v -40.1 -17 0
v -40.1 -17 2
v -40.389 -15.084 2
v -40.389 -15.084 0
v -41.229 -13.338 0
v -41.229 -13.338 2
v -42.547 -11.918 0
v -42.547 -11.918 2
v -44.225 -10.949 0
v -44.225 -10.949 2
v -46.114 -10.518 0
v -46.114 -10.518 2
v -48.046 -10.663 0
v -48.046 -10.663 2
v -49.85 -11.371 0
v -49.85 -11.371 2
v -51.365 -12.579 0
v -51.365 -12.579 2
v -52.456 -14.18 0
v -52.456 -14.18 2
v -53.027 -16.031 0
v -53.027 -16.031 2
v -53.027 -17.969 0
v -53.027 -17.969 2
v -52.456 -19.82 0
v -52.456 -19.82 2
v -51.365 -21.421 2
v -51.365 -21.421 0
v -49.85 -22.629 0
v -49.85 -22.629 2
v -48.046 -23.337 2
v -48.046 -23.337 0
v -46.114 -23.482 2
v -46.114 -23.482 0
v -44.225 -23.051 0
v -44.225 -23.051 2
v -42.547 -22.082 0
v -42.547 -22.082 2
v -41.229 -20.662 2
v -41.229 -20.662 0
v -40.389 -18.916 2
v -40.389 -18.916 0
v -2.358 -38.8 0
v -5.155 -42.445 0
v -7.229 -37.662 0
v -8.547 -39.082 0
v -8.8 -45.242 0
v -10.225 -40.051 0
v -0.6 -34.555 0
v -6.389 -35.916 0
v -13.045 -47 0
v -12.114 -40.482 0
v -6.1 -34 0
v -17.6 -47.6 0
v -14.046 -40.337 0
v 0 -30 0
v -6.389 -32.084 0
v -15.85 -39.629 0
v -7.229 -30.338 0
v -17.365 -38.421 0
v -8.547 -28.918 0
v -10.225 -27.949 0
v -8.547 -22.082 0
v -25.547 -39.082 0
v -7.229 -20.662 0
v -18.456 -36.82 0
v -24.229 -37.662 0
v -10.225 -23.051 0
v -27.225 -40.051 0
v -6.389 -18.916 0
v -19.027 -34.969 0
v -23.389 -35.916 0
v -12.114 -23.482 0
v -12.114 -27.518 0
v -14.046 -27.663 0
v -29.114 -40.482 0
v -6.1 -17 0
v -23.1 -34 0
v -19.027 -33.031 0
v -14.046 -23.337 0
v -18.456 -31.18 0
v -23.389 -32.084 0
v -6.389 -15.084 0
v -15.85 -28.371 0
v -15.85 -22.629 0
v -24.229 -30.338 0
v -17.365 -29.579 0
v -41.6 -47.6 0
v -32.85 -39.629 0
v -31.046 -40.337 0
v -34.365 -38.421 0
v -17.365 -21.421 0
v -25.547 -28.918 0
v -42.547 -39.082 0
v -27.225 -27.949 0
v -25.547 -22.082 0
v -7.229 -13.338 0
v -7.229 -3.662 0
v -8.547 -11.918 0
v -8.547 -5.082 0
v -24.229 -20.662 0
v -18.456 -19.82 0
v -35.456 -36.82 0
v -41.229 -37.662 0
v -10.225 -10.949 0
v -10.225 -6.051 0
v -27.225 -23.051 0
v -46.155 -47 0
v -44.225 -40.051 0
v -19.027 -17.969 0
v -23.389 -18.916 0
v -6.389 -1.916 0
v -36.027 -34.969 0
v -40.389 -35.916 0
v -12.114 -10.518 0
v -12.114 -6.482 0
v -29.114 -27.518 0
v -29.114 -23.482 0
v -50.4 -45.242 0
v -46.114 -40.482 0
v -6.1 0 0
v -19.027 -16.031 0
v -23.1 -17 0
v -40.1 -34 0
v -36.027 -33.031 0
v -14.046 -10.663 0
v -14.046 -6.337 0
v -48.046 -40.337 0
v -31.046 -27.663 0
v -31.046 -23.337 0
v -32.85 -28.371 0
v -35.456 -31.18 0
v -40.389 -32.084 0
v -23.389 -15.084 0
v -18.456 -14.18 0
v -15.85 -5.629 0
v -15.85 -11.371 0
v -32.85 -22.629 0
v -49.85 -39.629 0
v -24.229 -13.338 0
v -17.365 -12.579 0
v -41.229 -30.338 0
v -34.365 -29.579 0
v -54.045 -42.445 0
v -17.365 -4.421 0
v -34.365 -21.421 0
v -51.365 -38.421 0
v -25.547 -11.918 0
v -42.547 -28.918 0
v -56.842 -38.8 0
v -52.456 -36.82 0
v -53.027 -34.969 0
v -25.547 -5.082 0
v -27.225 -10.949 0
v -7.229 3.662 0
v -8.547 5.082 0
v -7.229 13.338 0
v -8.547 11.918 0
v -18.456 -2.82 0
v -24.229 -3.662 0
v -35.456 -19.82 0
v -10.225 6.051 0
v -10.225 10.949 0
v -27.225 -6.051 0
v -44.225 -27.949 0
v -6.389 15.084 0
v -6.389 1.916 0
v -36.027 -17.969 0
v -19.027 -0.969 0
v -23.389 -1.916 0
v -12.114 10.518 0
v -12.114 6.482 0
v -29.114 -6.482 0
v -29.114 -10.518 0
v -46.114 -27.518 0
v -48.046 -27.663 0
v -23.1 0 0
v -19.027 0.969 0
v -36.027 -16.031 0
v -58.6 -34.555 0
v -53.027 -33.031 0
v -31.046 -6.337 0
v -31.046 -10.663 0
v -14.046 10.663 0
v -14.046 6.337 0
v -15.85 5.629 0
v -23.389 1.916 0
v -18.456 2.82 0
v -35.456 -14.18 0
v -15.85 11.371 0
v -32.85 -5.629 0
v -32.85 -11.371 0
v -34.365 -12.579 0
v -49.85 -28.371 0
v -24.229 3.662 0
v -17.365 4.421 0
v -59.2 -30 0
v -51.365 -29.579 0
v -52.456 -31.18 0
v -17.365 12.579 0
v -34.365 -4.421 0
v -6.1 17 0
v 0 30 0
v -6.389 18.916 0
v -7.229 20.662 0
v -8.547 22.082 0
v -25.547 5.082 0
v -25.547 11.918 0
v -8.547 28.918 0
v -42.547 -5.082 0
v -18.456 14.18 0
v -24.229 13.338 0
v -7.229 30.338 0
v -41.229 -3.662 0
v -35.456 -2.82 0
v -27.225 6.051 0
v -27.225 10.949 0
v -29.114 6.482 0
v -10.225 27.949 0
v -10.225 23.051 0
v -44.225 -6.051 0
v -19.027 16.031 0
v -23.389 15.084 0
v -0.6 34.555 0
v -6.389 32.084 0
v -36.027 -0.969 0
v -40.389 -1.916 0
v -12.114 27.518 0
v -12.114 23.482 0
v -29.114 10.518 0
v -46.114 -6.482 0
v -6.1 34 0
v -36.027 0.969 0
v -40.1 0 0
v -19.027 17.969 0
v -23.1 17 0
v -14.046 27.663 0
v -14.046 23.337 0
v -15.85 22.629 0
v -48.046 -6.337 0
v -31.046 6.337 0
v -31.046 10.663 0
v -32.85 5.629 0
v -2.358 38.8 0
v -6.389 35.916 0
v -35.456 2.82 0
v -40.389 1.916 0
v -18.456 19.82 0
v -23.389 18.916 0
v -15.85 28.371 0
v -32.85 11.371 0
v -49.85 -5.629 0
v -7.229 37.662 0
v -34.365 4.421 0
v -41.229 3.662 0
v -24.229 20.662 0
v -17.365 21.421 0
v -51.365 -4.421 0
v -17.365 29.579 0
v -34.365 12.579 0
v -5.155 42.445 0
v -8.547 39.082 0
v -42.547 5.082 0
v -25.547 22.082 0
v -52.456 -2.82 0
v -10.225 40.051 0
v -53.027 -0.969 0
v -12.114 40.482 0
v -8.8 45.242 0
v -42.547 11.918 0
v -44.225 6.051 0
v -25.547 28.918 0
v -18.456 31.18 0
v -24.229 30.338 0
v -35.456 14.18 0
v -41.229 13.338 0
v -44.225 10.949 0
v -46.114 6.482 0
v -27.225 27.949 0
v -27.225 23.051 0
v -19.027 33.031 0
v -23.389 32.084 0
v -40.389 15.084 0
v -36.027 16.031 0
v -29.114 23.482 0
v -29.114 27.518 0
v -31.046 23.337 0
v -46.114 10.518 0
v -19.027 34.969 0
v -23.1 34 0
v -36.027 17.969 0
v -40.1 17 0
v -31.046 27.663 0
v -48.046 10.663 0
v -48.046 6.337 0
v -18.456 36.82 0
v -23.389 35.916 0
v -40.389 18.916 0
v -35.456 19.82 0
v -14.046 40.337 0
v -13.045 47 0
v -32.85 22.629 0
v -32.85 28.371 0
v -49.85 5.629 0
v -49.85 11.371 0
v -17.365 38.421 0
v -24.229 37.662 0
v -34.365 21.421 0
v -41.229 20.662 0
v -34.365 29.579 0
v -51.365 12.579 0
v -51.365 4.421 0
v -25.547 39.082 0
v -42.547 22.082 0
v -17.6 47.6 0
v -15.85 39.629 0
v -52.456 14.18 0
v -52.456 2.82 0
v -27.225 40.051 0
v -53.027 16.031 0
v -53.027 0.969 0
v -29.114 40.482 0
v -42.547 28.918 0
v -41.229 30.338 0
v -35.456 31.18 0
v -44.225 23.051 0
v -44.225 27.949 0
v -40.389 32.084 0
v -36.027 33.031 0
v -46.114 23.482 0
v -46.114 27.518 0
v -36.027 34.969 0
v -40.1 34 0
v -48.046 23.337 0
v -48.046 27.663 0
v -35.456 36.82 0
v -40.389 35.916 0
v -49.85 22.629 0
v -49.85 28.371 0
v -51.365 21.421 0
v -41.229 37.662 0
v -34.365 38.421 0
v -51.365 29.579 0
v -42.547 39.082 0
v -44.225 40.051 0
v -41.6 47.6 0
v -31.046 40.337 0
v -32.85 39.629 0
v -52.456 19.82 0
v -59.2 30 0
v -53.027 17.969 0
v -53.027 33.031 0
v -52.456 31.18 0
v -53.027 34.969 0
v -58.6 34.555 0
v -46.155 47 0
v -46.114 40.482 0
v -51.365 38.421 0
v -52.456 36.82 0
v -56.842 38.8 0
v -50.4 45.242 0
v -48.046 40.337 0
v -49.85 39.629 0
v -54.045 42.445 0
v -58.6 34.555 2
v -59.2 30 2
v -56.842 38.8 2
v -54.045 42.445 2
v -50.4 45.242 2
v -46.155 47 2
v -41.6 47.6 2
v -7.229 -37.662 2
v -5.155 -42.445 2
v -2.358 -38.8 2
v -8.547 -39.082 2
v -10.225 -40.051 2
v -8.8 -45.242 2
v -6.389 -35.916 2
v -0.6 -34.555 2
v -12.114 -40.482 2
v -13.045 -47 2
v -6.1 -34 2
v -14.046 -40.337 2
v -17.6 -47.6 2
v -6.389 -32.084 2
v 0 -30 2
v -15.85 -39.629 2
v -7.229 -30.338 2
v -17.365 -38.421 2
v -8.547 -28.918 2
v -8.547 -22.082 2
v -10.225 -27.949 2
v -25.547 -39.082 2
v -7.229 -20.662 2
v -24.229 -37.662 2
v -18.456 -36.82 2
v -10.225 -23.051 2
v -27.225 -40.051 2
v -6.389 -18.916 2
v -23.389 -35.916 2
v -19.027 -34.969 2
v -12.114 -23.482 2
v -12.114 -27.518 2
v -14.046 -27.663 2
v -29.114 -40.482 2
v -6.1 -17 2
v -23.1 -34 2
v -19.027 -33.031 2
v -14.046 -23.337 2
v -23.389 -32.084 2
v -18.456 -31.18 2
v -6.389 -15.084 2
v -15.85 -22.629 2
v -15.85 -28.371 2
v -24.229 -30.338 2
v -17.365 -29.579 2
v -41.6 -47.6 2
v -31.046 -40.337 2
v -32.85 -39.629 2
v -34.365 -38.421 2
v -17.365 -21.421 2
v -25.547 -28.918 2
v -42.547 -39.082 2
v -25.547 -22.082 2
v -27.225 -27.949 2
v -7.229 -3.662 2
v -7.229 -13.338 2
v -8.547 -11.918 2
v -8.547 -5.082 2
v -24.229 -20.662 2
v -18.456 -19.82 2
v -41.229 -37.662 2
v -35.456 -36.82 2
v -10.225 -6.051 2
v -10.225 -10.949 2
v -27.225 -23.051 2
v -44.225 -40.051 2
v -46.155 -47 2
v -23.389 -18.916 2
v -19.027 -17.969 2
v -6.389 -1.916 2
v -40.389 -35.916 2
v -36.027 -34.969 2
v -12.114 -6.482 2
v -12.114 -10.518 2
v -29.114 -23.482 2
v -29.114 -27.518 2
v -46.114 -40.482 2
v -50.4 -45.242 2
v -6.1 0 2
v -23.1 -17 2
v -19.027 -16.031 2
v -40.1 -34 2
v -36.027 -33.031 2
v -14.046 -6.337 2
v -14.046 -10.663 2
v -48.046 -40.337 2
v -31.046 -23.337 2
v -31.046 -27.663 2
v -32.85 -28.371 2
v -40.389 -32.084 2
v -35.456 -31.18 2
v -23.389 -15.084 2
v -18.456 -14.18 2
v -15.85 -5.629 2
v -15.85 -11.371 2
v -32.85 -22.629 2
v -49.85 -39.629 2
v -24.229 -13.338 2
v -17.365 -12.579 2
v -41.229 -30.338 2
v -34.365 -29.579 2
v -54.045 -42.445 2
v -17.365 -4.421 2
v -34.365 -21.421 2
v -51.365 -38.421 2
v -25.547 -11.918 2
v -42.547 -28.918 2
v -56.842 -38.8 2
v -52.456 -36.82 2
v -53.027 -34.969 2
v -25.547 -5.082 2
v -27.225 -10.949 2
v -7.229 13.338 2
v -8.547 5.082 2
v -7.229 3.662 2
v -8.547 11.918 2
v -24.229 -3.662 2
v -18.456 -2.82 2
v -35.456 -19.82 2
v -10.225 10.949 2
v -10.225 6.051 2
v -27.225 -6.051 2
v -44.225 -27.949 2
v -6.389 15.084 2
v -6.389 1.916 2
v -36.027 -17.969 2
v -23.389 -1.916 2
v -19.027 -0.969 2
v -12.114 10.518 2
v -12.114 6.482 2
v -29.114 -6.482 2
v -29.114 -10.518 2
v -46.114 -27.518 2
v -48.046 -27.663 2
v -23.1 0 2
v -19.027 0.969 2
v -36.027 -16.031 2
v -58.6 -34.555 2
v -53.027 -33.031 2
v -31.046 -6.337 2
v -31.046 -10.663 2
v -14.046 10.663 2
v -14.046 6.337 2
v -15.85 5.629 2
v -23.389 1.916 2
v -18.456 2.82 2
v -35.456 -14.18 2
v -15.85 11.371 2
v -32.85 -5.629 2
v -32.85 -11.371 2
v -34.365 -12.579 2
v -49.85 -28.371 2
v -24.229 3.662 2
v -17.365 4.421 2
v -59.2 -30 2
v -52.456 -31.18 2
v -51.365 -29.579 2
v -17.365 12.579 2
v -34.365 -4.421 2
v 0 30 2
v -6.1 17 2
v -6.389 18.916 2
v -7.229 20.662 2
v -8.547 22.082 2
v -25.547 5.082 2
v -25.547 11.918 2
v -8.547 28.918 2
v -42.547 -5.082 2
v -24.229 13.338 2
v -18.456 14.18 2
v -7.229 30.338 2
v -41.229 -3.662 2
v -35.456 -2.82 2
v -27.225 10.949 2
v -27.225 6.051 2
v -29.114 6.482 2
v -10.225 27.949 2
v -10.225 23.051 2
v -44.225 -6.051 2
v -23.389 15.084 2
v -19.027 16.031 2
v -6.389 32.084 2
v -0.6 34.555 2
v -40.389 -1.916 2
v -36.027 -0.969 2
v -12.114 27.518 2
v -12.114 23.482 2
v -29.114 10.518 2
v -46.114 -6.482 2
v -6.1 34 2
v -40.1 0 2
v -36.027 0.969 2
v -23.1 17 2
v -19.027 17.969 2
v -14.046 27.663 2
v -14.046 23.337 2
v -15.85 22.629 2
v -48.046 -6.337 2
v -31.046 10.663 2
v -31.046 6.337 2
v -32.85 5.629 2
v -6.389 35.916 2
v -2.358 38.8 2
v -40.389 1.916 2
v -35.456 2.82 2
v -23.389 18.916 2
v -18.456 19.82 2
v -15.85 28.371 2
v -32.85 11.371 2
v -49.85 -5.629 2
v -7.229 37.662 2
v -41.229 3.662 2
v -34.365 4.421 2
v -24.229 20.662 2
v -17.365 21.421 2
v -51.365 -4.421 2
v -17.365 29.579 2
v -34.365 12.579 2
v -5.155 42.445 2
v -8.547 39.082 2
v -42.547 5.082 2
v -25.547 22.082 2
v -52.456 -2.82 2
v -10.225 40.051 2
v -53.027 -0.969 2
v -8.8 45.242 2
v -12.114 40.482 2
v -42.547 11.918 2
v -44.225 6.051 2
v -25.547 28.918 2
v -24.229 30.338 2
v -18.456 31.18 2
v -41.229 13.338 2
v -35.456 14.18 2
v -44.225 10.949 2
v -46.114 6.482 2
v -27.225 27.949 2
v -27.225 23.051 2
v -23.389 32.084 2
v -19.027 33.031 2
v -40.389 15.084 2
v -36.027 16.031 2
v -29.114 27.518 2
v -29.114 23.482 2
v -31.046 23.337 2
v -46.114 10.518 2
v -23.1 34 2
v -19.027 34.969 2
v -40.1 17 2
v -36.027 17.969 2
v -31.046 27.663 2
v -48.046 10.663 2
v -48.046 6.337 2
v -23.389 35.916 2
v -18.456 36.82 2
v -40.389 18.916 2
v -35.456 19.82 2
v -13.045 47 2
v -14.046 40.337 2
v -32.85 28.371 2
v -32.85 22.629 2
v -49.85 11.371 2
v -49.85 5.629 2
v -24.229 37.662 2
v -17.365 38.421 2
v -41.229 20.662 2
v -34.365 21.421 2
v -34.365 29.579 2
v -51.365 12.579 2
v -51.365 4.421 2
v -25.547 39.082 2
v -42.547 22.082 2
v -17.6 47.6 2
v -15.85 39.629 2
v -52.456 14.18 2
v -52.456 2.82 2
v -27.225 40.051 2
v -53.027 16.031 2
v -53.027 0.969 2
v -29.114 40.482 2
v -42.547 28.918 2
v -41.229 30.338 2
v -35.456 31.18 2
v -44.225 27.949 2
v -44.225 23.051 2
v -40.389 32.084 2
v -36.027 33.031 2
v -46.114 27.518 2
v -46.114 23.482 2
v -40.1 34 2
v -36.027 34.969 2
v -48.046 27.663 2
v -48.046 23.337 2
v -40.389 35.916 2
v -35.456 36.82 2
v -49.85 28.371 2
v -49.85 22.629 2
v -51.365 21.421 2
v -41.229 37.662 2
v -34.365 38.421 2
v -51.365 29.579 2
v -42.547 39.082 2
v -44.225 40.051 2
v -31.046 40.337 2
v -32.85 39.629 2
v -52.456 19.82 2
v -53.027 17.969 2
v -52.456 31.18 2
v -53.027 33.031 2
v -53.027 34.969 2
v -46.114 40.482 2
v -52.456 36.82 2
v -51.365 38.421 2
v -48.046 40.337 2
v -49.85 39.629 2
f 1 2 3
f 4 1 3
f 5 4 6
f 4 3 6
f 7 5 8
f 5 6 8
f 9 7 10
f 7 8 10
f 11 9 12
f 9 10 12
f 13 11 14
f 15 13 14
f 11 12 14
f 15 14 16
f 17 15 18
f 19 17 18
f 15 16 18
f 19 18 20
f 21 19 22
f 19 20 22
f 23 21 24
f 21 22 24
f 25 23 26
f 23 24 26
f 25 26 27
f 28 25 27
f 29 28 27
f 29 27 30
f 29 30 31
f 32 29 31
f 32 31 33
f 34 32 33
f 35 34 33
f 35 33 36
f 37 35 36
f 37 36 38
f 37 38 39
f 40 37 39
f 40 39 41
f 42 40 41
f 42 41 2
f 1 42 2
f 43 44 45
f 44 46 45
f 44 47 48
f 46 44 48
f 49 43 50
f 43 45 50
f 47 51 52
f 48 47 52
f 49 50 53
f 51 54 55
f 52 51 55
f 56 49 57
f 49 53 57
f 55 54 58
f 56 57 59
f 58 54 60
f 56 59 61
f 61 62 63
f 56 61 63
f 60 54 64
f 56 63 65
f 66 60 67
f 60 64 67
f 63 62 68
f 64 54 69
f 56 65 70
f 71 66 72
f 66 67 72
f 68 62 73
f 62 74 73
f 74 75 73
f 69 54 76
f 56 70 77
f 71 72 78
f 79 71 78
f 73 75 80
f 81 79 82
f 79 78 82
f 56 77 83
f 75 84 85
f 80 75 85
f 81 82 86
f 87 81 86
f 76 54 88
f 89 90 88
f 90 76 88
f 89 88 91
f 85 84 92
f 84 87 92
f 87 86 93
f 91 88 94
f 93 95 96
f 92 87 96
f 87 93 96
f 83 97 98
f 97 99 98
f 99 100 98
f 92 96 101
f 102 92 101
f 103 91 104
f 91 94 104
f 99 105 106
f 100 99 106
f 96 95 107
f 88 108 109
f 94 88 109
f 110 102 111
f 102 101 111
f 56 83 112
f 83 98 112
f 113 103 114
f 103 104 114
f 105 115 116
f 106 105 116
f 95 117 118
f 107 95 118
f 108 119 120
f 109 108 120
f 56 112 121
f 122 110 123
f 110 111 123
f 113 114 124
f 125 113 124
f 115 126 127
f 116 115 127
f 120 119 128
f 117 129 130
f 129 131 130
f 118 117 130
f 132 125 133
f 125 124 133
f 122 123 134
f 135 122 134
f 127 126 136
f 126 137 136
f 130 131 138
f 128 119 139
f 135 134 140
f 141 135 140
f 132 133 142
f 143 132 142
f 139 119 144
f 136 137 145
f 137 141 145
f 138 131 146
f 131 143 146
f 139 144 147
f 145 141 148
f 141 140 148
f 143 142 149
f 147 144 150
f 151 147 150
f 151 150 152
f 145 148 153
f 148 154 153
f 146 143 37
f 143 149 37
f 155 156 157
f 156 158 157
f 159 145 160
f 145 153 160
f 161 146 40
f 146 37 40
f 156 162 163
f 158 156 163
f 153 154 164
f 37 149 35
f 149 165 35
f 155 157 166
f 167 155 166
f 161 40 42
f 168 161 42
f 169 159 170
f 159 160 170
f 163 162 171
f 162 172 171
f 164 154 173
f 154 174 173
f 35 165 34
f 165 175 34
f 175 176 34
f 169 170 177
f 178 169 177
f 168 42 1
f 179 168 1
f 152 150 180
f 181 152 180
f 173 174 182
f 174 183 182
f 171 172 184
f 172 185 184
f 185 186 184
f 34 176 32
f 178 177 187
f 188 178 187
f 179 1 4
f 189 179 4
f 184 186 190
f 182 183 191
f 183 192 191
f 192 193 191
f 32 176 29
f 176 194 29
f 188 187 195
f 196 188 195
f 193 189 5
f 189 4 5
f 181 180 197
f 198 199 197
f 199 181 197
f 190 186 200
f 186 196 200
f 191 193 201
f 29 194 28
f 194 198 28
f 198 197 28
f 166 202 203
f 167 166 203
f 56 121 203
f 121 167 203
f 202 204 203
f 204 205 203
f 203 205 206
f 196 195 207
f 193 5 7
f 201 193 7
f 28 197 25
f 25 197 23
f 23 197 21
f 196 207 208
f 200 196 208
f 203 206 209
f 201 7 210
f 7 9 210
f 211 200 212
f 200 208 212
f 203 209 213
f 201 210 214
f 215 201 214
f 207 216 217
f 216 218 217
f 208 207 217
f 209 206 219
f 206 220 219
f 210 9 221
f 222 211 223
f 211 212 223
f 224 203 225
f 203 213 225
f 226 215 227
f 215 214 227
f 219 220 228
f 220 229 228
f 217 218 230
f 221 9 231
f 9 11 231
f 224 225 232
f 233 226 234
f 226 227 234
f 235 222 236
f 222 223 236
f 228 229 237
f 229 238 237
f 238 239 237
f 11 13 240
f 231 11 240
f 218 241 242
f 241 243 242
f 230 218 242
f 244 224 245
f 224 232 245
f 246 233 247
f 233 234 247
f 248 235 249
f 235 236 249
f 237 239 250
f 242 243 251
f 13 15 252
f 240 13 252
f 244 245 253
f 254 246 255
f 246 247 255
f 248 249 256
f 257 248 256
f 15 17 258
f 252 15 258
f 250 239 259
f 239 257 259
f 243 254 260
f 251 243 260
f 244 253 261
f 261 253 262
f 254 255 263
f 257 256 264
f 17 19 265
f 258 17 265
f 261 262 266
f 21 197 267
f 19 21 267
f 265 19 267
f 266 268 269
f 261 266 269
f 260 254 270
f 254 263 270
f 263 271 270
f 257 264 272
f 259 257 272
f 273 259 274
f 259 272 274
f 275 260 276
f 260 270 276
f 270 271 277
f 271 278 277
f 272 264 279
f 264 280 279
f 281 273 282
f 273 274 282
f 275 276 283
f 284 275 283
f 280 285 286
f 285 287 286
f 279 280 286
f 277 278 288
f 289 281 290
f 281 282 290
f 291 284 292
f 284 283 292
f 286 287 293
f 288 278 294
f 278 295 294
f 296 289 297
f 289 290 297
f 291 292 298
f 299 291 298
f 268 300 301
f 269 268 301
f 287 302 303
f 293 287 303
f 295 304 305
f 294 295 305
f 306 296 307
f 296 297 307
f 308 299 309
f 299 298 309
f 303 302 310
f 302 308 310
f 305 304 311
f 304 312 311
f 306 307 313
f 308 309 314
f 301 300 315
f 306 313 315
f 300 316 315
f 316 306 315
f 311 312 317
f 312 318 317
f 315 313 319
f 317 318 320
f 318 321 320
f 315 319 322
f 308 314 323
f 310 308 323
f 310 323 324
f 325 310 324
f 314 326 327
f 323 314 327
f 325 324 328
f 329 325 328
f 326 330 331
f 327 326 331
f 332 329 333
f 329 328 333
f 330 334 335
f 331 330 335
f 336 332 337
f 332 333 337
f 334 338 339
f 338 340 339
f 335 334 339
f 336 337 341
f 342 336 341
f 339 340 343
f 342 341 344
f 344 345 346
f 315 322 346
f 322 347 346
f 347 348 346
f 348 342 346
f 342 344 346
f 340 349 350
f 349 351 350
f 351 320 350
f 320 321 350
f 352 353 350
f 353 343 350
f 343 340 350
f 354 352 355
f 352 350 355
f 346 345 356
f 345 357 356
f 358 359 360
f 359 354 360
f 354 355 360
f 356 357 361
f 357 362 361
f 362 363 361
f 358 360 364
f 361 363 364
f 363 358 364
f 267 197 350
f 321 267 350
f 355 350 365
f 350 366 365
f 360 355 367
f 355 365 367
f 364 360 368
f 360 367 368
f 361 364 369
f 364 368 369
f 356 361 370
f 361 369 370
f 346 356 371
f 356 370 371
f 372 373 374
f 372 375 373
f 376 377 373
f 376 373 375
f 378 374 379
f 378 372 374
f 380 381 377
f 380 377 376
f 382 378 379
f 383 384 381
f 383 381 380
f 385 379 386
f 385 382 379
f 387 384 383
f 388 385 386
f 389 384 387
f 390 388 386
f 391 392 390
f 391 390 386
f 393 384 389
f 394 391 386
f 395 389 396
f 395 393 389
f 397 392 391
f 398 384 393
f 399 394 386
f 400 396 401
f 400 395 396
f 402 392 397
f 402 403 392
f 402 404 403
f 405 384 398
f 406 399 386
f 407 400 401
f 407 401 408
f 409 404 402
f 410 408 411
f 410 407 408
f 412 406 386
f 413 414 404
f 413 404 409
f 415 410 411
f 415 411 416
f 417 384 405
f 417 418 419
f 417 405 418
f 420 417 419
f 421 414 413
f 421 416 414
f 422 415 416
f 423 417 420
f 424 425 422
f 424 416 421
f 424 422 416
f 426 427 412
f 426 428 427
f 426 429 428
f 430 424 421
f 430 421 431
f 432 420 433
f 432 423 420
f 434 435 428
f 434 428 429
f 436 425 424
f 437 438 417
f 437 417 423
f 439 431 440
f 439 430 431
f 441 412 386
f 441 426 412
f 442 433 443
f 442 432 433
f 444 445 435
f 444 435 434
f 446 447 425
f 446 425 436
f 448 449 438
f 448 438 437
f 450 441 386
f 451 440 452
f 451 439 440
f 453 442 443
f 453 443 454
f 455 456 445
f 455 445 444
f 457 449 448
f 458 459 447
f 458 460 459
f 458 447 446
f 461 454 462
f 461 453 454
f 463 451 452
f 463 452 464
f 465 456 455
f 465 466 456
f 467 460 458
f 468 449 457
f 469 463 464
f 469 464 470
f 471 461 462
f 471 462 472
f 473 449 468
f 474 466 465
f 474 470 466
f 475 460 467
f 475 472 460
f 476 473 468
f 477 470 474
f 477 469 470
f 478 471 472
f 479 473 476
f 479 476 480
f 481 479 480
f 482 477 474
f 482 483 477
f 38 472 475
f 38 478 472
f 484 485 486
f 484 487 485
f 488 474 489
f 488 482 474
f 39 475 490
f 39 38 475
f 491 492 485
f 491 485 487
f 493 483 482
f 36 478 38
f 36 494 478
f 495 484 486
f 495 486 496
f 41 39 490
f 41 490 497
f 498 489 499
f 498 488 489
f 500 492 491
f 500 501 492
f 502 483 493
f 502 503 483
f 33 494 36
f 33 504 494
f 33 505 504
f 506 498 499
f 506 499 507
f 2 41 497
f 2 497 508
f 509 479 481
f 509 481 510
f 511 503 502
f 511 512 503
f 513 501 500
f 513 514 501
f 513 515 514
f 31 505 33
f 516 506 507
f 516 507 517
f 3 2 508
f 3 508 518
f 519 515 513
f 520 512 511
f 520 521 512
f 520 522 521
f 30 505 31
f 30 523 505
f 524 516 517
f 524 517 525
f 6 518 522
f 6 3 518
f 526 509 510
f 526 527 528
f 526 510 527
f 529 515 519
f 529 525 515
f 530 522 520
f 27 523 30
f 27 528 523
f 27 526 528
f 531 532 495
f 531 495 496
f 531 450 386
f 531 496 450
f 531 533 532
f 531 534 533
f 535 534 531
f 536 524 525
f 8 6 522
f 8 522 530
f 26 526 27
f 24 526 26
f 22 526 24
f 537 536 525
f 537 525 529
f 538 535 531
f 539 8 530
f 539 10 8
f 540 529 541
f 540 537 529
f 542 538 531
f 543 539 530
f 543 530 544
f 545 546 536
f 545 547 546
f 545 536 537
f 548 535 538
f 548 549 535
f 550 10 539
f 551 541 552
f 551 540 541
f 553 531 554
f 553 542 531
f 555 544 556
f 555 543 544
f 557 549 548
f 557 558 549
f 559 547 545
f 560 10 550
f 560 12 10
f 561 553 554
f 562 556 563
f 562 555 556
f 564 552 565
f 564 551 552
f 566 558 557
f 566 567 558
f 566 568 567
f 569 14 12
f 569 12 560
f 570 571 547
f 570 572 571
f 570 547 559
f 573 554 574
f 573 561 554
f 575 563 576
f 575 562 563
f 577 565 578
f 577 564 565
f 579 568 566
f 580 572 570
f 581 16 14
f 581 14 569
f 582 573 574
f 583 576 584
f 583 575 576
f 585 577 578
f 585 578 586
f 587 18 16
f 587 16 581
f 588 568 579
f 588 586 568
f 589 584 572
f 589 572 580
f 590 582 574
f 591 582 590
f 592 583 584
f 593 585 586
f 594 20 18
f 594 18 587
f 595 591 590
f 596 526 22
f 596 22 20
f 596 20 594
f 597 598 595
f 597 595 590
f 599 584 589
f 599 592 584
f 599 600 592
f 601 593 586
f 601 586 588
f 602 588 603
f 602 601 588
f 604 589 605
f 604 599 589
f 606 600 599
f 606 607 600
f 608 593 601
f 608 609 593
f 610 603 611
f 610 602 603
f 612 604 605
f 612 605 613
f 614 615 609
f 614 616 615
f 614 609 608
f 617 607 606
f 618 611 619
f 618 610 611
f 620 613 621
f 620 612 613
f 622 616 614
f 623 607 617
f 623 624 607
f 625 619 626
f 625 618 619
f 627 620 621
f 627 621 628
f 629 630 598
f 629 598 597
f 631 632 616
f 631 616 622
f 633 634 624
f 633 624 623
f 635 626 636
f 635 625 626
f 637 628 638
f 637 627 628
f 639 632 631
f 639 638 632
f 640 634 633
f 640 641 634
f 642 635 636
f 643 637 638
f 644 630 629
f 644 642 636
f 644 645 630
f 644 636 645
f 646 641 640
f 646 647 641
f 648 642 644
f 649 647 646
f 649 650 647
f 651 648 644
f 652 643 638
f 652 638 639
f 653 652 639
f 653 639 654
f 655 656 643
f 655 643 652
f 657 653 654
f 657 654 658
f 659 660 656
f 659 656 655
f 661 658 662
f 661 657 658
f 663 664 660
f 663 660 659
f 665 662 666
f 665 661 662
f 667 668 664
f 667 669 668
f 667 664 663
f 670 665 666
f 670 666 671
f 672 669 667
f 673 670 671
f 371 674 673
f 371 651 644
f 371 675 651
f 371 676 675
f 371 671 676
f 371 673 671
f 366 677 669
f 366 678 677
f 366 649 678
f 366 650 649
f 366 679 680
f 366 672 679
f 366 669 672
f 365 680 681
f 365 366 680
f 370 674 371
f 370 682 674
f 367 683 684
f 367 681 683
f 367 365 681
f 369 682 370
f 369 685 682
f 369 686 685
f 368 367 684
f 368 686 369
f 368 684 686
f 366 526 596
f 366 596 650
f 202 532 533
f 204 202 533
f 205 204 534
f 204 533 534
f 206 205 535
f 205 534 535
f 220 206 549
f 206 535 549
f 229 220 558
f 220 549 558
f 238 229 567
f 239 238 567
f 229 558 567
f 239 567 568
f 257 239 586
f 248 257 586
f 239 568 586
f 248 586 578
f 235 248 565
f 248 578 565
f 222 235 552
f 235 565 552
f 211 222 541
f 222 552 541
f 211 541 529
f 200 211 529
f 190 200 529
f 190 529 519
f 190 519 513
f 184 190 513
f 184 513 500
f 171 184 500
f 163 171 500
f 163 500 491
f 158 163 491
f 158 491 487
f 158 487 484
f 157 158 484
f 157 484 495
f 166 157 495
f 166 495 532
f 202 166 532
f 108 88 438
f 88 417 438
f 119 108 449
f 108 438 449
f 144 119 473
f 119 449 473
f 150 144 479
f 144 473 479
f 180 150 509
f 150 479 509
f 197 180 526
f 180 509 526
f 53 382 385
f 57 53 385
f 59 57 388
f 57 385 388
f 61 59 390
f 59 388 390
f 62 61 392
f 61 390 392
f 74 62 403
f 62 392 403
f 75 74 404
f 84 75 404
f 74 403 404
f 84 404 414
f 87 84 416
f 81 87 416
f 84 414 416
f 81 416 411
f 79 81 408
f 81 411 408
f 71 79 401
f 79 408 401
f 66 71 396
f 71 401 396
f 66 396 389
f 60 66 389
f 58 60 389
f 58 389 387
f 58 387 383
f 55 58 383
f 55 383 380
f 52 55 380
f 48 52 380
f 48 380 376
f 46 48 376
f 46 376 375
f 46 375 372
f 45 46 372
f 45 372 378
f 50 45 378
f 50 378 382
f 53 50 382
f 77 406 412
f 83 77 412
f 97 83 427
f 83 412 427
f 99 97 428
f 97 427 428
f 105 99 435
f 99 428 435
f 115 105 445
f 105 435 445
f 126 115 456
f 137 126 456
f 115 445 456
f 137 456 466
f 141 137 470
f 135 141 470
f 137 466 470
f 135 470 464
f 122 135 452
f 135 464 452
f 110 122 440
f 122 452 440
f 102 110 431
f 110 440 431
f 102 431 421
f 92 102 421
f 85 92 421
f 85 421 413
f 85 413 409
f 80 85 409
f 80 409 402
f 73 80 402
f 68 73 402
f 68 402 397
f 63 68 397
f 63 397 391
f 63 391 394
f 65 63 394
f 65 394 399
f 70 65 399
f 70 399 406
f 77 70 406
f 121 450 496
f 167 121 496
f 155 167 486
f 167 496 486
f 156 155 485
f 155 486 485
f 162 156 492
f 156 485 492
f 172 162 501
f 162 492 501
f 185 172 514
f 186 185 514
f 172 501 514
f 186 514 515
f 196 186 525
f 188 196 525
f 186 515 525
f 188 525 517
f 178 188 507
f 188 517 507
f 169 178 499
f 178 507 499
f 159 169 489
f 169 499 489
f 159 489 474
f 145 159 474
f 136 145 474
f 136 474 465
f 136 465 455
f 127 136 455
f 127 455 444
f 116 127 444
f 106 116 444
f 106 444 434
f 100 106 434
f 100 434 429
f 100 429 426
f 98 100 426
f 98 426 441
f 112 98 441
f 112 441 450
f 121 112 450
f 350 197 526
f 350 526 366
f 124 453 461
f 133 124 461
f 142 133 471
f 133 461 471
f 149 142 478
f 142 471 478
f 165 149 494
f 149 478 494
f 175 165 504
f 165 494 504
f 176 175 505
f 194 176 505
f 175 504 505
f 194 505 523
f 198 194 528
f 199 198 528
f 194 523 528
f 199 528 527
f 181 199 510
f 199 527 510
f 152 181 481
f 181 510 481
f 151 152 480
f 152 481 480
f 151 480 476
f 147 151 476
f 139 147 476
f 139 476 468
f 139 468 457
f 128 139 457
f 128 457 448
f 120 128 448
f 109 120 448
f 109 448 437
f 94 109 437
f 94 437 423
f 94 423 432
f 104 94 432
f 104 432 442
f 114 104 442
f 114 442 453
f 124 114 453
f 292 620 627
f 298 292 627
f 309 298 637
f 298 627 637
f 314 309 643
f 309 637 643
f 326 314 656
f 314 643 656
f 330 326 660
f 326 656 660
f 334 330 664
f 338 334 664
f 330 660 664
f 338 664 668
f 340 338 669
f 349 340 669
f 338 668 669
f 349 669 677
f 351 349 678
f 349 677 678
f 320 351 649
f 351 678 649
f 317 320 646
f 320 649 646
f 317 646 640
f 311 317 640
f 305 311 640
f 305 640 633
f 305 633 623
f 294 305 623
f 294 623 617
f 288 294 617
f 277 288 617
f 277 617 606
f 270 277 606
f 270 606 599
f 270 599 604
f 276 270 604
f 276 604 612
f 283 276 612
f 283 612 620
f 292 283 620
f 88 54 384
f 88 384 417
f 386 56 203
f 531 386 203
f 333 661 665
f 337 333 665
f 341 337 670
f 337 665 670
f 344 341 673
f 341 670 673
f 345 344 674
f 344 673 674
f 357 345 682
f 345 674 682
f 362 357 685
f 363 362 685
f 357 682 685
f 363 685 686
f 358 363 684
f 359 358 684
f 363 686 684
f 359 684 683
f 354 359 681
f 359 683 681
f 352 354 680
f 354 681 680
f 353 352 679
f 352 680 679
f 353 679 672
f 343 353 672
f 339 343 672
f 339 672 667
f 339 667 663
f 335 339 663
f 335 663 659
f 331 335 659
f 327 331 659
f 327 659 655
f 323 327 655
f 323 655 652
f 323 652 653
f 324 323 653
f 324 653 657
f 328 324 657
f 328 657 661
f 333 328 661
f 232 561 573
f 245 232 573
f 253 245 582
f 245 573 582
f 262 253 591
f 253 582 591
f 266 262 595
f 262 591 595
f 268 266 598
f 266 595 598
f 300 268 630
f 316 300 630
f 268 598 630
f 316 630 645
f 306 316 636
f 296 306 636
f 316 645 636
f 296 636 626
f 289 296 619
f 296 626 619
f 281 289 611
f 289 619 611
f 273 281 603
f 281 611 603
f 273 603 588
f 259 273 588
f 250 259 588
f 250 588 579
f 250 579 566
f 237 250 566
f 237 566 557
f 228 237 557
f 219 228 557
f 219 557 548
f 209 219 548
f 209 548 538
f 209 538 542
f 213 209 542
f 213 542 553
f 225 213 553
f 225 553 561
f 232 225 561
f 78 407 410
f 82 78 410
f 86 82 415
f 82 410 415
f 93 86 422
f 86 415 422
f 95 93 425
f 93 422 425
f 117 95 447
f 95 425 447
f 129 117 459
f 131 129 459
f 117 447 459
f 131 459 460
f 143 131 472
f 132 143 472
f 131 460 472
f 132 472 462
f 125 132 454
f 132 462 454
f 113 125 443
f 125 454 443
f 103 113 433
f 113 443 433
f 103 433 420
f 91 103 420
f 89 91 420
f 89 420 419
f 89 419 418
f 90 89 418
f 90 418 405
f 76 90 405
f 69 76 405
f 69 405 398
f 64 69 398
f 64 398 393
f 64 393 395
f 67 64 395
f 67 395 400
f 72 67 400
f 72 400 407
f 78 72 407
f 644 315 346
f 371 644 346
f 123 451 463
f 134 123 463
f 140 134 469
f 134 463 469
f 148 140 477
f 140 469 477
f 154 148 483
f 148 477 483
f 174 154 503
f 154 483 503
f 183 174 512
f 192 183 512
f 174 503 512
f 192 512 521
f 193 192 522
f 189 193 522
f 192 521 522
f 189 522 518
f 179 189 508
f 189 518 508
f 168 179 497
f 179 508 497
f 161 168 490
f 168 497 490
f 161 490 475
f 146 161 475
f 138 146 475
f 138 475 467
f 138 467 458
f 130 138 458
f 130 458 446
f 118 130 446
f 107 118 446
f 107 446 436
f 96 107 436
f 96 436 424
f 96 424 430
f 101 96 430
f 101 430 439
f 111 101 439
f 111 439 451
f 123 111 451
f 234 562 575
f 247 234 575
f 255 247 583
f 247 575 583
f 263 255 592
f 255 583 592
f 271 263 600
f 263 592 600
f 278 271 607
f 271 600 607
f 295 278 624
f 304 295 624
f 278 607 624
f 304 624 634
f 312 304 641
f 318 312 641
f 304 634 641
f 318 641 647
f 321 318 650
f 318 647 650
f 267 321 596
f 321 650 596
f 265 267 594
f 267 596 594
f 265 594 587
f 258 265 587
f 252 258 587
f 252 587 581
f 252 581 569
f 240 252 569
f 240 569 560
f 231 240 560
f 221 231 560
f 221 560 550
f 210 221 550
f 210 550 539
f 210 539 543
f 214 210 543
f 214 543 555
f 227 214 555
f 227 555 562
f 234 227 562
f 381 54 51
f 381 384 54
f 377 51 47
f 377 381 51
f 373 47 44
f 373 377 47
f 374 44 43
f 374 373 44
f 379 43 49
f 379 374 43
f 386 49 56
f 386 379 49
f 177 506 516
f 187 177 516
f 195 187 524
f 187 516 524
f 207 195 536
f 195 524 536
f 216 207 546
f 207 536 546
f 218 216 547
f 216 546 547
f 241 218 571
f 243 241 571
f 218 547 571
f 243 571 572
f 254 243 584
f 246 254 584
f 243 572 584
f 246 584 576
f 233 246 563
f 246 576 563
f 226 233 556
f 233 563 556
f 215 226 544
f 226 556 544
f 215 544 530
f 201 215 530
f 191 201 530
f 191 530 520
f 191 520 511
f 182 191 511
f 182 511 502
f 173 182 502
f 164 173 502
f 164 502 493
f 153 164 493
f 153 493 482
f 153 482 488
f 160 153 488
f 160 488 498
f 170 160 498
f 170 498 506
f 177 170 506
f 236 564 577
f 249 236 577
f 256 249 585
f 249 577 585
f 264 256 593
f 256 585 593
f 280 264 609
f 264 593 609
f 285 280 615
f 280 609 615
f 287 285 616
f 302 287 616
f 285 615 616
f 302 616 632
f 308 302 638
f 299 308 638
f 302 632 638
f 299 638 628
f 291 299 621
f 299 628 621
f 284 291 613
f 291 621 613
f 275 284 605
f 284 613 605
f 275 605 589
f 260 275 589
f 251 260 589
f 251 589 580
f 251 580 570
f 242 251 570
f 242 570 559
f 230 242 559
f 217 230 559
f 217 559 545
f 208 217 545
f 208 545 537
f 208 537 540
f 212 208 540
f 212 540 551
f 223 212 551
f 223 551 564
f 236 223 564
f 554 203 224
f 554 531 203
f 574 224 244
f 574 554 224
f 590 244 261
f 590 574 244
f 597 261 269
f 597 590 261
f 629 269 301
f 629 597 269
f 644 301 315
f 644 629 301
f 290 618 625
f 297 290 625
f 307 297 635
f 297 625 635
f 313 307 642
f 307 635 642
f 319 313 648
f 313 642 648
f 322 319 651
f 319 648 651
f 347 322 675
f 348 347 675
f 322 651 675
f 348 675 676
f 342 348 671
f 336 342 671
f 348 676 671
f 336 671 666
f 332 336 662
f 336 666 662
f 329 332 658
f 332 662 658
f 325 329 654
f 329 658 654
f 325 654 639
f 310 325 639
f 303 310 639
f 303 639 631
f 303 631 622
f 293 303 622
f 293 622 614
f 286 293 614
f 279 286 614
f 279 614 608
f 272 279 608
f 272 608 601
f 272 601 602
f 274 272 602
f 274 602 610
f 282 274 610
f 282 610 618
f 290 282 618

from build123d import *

# Parameters (mm, degrees)
SKETCH1_W               = 95.2
SKETCH1_H               = 59.2
BOSS_EXTRUDE1_DEPTH     = 2
SKETCH2_R               = 6.5
CUT_EXTRUDE2_DEPTH      = 1
CUT_EXTRUDE2_DEPTH_BACK = 3
FILLET1_R               = 17.6


with BuildPart() as part:
    # Sketch1 → Boss-Extrude1 (new body)
    with BuildSketch(Plane(origin=(0, 0, 0), x_dir=(0, 1, 0), z_dir=(0, 0, 1))):
        with Locations((0, 29.6)):
            Rectangle(SKETCH1_W, SKETCH1_H)
    extrude(amount=BOSS_EXTRUDE1_DEPTH)

    # Sketch2 → Cut-Extrude2 (cut, two sides)
    with BuildSketch(Plane.XY.offset(2)) as cut_extrude2_sk:
        with Locations((-29.6, 0)):
            Circle(SKETCH2_R)
        with Locations((-46.6, 0)):
            Circle(SKETCH2_R)
        with Locations((-12.6, 0)):
            Circle(SKETCH2_R)
        with Locations((-12.6, -17)):
            Circle(SKETCH2_R)
        with Locations((-46.6, -17)):
            Circle(SKETCH2_R)
        with Locations((-29.6, -17)):
            Circle(SKETCH2_R)
        with Locations((-12.6, -34)):
            Circle(SKETCH2_R)
        with Locations((-46.6, -34)):
            Circle(SKETCH2_R)
        with Locations((-29.6, -34)):
            Circle(SKETCH2_R)
        with Locations((-46.6, 17)):
            Circle(SKETCH2_R)
        with Locations((-29.6, 17)):
            Circle(SKETCH2_R)
        with Locations((-12.6, 17)):
            Circle(SKETCH2_R)
        with Locations((-46.6, 34)):
            Circle(SKETCH2_R)
        with Locations((-29.6, 34)):
            Circle(SKETCH2_R)
        with Locations((-12.6, 34)):
            Circle(SKETCH2_R)
    extrude(amount=CUT_EXTRUDE2_DEPTH, mode=Mode.SUBTRACT)
    extrude(cut_extrude2_sk.sketch, amount=-CUT_EXTRUDE2_DEPTH_BACK, mode=Mode.SUBTRACT)

    # Fillet1
    fillet1_edges = [part.edges().sort_by_distance(p)[0] for p in [
        (-59.2, -47.6, 1),
        (-59.2, 47.6, 1),
        (0, 47.6, 1),
        (0, -47.6, 1),
    ]]
    fillet(fillet1_edges, radius=FILLET1_R)


solid = part.part
